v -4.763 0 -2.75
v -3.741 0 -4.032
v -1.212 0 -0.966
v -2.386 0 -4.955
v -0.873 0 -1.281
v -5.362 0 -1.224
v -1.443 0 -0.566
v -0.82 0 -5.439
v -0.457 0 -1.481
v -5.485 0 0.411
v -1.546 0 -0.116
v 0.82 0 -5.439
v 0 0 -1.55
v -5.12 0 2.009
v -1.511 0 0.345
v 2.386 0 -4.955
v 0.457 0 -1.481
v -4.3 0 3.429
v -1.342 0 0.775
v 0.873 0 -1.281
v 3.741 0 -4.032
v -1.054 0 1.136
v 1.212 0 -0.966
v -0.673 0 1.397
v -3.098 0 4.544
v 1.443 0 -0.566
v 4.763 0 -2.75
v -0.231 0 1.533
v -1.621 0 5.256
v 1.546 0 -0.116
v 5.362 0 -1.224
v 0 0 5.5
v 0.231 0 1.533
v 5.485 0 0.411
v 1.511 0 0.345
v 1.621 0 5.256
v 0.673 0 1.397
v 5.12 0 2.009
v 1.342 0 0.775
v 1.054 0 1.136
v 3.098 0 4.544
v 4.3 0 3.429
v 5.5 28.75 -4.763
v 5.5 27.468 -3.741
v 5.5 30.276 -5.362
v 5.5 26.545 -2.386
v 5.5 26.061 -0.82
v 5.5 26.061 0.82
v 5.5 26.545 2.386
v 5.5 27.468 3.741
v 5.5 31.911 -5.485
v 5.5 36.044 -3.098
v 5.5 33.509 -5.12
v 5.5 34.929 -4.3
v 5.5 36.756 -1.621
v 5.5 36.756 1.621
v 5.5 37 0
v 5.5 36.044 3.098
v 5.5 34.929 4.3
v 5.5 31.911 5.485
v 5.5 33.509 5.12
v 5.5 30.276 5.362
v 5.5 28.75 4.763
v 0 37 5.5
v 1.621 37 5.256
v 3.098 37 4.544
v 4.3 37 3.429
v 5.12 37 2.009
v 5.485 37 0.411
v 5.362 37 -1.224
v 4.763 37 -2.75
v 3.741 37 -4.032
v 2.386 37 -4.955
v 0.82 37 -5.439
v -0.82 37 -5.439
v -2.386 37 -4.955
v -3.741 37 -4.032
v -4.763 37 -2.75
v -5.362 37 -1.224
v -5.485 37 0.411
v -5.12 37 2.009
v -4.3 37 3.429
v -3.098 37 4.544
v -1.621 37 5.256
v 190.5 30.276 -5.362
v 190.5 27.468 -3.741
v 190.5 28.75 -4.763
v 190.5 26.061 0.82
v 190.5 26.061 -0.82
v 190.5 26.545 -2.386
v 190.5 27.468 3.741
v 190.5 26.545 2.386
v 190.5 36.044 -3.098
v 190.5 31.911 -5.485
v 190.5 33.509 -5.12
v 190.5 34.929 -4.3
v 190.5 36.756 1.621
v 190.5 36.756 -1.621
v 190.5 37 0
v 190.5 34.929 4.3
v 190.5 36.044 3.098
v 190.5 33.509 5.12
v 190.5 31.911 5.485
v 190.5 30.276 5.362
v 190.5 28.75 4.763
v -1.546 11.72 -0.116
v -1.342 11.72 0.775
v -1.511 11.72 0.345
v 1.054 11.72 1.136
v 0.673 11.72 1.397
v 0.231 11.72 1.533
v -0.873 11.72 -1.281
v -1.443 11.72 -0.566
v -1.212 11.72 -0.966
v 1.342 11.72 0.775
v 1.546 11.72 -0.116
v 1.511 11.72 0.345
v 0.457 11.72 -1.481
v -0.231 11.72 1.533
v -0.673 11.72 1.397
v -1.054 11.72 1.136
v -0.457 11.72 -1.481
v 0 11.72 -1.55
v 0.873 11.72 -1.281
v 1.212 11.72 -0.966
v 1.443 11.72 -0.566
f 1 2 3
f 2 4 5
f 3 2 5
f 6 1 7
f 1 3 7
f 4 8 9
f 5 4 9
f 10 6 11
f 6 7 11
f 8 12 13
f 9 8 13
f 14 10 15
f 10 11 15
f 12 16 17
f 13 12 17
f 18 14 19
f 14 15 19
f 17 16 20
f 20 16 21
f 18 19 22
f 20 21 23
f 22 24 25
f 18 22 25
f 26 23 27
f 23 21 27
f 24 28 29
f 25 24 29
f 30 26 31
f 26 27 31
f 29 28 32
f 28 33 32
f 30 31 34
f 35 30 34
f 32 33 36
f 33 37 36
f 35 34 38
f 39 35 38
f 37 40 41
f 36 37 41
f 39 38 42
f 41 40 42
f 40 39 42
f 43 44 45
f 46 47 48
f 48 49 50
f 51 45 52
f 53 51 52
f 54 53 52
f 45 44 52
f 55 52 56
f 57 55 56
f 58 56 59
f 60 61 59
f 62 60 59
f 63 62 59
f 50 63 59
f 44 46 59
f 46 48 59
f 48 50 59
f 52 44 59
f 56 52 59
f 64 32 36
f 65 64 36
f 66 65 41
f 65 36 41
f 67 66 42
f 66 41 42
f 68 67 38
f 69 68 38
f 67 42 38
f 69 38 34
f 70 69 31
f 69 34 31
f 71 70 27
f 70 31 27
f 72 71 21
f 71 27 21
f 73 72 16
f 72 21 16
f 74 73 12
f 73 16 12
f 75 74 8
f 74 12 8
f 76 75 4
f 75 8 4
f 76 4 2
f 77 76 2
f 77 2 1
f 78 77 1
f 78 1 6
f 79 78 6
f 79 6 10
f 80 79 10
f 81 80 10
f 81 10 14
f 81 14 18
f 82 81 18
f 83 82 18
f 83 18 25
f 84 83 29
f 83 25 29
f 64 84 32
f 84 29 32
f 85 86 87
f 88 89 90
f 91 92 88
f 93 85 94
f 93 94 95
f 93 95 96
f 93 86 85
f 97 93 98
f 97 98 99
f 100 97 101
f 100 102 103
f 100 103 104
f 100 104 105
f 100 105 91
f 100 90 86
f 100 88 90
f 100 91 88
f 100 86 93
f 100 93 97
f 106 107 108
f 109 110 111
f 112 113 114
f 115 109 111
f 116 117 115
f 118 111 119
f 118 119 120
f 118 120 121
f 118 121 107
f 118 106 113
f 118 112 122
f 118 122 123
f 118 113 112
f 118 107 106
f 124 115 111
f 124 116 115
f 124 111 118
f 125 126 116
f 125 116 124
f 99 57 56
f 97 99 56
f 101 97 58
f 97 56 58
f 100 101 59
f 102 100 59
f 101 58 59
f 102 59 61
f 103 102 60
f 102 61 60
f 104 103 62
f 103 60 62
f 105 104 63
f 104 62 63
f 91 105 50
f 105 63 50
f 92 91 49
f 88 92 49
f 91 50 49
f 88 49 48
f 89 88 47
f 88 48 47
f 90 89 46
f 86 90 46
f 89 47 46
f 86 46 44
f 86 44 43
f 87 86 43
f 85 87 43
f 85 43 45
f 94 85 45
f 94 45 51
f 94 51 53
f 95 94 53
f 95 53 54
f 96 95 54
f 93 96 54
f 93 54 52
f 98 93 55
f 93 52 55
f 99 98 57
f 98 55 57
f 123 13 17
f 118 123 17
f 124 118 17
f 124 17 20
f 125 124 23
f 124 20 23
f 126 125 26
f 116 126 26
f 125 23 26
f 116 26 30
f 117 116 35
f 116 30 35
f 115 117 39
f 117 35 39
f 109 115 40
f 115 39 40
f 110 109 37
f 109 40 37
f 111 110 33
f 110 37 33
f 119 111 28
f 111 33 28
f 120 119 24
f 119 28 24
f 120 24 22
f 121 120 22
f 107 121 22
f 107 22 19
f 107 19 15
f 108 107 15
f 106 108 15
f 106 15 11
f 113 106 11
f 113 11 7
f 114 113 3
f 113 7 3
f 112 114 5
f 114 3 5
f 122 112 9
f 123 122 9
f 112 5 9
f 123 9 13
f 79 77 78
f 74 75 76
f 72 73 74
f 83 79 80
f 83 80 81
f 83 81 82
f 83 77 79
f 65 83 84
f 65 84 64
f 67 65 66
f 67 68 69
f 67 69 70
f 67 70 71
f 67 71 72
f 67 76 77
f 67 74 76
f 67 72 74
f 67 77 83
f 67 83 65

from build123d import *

# Parameters (mm, degrees)
SKETCH1_R               = 5.5
BOSS_EXTRUDE1_DEPTH     = 37
BOSS_EXTRUDE2_START     = 5.5
BOSS_EXTRUDE2_OUTLINE_R = 5.5
BOSS_EXTRUDE2_DEPTH     = 185
SKETCH2_R               = 1.55
CUT_EXTRUDE1_DEPTH      = 11.72


# Read off the part's stored shape, not the designer's step: Boss-Extrude2
with BuildPart() as part:
    # Sketch1 → Boss-Extrude1 (new body)
    with BuildSketch(Plane(origin=(0, 0, 0), x_dir=(1, 0, 0), z_dir=(0, 1, 0))):
        with Locations(Location((0, 0, 0), (0, 0, 270))):
            Circle(SKETCH1_R)
    extrude(amount=BOSS_EXTRUDE1_DEPTH)

    # Sketch2 → Cut-Extrude1 (cut)
    with BuildSketch(Plane.XZ):
        with Locations(Location((0, 0, 0), (0, 0, 270))):
            Circle(SKETCH2_R)
    extrude(amount=-CUT_EXTRUDE1_DEPTH, mode=Mode.SUBTRACT)


with BuildPart() as body_2:
    # Boss-Extrude2 outline → Boss-Extrude2 (new body)
    with BuildSketch(Plane.YZ.offset(BOSS_EXTRUDE2_START)):
        with Locations((31.5, 0)):
            Circle(BOSS_EXTRUDE2_OUTLINE_R)
    extrude(amount=BOSS_EXTRUDE2_DEPTH)


solid = Compound([part.part, body_2.part])
